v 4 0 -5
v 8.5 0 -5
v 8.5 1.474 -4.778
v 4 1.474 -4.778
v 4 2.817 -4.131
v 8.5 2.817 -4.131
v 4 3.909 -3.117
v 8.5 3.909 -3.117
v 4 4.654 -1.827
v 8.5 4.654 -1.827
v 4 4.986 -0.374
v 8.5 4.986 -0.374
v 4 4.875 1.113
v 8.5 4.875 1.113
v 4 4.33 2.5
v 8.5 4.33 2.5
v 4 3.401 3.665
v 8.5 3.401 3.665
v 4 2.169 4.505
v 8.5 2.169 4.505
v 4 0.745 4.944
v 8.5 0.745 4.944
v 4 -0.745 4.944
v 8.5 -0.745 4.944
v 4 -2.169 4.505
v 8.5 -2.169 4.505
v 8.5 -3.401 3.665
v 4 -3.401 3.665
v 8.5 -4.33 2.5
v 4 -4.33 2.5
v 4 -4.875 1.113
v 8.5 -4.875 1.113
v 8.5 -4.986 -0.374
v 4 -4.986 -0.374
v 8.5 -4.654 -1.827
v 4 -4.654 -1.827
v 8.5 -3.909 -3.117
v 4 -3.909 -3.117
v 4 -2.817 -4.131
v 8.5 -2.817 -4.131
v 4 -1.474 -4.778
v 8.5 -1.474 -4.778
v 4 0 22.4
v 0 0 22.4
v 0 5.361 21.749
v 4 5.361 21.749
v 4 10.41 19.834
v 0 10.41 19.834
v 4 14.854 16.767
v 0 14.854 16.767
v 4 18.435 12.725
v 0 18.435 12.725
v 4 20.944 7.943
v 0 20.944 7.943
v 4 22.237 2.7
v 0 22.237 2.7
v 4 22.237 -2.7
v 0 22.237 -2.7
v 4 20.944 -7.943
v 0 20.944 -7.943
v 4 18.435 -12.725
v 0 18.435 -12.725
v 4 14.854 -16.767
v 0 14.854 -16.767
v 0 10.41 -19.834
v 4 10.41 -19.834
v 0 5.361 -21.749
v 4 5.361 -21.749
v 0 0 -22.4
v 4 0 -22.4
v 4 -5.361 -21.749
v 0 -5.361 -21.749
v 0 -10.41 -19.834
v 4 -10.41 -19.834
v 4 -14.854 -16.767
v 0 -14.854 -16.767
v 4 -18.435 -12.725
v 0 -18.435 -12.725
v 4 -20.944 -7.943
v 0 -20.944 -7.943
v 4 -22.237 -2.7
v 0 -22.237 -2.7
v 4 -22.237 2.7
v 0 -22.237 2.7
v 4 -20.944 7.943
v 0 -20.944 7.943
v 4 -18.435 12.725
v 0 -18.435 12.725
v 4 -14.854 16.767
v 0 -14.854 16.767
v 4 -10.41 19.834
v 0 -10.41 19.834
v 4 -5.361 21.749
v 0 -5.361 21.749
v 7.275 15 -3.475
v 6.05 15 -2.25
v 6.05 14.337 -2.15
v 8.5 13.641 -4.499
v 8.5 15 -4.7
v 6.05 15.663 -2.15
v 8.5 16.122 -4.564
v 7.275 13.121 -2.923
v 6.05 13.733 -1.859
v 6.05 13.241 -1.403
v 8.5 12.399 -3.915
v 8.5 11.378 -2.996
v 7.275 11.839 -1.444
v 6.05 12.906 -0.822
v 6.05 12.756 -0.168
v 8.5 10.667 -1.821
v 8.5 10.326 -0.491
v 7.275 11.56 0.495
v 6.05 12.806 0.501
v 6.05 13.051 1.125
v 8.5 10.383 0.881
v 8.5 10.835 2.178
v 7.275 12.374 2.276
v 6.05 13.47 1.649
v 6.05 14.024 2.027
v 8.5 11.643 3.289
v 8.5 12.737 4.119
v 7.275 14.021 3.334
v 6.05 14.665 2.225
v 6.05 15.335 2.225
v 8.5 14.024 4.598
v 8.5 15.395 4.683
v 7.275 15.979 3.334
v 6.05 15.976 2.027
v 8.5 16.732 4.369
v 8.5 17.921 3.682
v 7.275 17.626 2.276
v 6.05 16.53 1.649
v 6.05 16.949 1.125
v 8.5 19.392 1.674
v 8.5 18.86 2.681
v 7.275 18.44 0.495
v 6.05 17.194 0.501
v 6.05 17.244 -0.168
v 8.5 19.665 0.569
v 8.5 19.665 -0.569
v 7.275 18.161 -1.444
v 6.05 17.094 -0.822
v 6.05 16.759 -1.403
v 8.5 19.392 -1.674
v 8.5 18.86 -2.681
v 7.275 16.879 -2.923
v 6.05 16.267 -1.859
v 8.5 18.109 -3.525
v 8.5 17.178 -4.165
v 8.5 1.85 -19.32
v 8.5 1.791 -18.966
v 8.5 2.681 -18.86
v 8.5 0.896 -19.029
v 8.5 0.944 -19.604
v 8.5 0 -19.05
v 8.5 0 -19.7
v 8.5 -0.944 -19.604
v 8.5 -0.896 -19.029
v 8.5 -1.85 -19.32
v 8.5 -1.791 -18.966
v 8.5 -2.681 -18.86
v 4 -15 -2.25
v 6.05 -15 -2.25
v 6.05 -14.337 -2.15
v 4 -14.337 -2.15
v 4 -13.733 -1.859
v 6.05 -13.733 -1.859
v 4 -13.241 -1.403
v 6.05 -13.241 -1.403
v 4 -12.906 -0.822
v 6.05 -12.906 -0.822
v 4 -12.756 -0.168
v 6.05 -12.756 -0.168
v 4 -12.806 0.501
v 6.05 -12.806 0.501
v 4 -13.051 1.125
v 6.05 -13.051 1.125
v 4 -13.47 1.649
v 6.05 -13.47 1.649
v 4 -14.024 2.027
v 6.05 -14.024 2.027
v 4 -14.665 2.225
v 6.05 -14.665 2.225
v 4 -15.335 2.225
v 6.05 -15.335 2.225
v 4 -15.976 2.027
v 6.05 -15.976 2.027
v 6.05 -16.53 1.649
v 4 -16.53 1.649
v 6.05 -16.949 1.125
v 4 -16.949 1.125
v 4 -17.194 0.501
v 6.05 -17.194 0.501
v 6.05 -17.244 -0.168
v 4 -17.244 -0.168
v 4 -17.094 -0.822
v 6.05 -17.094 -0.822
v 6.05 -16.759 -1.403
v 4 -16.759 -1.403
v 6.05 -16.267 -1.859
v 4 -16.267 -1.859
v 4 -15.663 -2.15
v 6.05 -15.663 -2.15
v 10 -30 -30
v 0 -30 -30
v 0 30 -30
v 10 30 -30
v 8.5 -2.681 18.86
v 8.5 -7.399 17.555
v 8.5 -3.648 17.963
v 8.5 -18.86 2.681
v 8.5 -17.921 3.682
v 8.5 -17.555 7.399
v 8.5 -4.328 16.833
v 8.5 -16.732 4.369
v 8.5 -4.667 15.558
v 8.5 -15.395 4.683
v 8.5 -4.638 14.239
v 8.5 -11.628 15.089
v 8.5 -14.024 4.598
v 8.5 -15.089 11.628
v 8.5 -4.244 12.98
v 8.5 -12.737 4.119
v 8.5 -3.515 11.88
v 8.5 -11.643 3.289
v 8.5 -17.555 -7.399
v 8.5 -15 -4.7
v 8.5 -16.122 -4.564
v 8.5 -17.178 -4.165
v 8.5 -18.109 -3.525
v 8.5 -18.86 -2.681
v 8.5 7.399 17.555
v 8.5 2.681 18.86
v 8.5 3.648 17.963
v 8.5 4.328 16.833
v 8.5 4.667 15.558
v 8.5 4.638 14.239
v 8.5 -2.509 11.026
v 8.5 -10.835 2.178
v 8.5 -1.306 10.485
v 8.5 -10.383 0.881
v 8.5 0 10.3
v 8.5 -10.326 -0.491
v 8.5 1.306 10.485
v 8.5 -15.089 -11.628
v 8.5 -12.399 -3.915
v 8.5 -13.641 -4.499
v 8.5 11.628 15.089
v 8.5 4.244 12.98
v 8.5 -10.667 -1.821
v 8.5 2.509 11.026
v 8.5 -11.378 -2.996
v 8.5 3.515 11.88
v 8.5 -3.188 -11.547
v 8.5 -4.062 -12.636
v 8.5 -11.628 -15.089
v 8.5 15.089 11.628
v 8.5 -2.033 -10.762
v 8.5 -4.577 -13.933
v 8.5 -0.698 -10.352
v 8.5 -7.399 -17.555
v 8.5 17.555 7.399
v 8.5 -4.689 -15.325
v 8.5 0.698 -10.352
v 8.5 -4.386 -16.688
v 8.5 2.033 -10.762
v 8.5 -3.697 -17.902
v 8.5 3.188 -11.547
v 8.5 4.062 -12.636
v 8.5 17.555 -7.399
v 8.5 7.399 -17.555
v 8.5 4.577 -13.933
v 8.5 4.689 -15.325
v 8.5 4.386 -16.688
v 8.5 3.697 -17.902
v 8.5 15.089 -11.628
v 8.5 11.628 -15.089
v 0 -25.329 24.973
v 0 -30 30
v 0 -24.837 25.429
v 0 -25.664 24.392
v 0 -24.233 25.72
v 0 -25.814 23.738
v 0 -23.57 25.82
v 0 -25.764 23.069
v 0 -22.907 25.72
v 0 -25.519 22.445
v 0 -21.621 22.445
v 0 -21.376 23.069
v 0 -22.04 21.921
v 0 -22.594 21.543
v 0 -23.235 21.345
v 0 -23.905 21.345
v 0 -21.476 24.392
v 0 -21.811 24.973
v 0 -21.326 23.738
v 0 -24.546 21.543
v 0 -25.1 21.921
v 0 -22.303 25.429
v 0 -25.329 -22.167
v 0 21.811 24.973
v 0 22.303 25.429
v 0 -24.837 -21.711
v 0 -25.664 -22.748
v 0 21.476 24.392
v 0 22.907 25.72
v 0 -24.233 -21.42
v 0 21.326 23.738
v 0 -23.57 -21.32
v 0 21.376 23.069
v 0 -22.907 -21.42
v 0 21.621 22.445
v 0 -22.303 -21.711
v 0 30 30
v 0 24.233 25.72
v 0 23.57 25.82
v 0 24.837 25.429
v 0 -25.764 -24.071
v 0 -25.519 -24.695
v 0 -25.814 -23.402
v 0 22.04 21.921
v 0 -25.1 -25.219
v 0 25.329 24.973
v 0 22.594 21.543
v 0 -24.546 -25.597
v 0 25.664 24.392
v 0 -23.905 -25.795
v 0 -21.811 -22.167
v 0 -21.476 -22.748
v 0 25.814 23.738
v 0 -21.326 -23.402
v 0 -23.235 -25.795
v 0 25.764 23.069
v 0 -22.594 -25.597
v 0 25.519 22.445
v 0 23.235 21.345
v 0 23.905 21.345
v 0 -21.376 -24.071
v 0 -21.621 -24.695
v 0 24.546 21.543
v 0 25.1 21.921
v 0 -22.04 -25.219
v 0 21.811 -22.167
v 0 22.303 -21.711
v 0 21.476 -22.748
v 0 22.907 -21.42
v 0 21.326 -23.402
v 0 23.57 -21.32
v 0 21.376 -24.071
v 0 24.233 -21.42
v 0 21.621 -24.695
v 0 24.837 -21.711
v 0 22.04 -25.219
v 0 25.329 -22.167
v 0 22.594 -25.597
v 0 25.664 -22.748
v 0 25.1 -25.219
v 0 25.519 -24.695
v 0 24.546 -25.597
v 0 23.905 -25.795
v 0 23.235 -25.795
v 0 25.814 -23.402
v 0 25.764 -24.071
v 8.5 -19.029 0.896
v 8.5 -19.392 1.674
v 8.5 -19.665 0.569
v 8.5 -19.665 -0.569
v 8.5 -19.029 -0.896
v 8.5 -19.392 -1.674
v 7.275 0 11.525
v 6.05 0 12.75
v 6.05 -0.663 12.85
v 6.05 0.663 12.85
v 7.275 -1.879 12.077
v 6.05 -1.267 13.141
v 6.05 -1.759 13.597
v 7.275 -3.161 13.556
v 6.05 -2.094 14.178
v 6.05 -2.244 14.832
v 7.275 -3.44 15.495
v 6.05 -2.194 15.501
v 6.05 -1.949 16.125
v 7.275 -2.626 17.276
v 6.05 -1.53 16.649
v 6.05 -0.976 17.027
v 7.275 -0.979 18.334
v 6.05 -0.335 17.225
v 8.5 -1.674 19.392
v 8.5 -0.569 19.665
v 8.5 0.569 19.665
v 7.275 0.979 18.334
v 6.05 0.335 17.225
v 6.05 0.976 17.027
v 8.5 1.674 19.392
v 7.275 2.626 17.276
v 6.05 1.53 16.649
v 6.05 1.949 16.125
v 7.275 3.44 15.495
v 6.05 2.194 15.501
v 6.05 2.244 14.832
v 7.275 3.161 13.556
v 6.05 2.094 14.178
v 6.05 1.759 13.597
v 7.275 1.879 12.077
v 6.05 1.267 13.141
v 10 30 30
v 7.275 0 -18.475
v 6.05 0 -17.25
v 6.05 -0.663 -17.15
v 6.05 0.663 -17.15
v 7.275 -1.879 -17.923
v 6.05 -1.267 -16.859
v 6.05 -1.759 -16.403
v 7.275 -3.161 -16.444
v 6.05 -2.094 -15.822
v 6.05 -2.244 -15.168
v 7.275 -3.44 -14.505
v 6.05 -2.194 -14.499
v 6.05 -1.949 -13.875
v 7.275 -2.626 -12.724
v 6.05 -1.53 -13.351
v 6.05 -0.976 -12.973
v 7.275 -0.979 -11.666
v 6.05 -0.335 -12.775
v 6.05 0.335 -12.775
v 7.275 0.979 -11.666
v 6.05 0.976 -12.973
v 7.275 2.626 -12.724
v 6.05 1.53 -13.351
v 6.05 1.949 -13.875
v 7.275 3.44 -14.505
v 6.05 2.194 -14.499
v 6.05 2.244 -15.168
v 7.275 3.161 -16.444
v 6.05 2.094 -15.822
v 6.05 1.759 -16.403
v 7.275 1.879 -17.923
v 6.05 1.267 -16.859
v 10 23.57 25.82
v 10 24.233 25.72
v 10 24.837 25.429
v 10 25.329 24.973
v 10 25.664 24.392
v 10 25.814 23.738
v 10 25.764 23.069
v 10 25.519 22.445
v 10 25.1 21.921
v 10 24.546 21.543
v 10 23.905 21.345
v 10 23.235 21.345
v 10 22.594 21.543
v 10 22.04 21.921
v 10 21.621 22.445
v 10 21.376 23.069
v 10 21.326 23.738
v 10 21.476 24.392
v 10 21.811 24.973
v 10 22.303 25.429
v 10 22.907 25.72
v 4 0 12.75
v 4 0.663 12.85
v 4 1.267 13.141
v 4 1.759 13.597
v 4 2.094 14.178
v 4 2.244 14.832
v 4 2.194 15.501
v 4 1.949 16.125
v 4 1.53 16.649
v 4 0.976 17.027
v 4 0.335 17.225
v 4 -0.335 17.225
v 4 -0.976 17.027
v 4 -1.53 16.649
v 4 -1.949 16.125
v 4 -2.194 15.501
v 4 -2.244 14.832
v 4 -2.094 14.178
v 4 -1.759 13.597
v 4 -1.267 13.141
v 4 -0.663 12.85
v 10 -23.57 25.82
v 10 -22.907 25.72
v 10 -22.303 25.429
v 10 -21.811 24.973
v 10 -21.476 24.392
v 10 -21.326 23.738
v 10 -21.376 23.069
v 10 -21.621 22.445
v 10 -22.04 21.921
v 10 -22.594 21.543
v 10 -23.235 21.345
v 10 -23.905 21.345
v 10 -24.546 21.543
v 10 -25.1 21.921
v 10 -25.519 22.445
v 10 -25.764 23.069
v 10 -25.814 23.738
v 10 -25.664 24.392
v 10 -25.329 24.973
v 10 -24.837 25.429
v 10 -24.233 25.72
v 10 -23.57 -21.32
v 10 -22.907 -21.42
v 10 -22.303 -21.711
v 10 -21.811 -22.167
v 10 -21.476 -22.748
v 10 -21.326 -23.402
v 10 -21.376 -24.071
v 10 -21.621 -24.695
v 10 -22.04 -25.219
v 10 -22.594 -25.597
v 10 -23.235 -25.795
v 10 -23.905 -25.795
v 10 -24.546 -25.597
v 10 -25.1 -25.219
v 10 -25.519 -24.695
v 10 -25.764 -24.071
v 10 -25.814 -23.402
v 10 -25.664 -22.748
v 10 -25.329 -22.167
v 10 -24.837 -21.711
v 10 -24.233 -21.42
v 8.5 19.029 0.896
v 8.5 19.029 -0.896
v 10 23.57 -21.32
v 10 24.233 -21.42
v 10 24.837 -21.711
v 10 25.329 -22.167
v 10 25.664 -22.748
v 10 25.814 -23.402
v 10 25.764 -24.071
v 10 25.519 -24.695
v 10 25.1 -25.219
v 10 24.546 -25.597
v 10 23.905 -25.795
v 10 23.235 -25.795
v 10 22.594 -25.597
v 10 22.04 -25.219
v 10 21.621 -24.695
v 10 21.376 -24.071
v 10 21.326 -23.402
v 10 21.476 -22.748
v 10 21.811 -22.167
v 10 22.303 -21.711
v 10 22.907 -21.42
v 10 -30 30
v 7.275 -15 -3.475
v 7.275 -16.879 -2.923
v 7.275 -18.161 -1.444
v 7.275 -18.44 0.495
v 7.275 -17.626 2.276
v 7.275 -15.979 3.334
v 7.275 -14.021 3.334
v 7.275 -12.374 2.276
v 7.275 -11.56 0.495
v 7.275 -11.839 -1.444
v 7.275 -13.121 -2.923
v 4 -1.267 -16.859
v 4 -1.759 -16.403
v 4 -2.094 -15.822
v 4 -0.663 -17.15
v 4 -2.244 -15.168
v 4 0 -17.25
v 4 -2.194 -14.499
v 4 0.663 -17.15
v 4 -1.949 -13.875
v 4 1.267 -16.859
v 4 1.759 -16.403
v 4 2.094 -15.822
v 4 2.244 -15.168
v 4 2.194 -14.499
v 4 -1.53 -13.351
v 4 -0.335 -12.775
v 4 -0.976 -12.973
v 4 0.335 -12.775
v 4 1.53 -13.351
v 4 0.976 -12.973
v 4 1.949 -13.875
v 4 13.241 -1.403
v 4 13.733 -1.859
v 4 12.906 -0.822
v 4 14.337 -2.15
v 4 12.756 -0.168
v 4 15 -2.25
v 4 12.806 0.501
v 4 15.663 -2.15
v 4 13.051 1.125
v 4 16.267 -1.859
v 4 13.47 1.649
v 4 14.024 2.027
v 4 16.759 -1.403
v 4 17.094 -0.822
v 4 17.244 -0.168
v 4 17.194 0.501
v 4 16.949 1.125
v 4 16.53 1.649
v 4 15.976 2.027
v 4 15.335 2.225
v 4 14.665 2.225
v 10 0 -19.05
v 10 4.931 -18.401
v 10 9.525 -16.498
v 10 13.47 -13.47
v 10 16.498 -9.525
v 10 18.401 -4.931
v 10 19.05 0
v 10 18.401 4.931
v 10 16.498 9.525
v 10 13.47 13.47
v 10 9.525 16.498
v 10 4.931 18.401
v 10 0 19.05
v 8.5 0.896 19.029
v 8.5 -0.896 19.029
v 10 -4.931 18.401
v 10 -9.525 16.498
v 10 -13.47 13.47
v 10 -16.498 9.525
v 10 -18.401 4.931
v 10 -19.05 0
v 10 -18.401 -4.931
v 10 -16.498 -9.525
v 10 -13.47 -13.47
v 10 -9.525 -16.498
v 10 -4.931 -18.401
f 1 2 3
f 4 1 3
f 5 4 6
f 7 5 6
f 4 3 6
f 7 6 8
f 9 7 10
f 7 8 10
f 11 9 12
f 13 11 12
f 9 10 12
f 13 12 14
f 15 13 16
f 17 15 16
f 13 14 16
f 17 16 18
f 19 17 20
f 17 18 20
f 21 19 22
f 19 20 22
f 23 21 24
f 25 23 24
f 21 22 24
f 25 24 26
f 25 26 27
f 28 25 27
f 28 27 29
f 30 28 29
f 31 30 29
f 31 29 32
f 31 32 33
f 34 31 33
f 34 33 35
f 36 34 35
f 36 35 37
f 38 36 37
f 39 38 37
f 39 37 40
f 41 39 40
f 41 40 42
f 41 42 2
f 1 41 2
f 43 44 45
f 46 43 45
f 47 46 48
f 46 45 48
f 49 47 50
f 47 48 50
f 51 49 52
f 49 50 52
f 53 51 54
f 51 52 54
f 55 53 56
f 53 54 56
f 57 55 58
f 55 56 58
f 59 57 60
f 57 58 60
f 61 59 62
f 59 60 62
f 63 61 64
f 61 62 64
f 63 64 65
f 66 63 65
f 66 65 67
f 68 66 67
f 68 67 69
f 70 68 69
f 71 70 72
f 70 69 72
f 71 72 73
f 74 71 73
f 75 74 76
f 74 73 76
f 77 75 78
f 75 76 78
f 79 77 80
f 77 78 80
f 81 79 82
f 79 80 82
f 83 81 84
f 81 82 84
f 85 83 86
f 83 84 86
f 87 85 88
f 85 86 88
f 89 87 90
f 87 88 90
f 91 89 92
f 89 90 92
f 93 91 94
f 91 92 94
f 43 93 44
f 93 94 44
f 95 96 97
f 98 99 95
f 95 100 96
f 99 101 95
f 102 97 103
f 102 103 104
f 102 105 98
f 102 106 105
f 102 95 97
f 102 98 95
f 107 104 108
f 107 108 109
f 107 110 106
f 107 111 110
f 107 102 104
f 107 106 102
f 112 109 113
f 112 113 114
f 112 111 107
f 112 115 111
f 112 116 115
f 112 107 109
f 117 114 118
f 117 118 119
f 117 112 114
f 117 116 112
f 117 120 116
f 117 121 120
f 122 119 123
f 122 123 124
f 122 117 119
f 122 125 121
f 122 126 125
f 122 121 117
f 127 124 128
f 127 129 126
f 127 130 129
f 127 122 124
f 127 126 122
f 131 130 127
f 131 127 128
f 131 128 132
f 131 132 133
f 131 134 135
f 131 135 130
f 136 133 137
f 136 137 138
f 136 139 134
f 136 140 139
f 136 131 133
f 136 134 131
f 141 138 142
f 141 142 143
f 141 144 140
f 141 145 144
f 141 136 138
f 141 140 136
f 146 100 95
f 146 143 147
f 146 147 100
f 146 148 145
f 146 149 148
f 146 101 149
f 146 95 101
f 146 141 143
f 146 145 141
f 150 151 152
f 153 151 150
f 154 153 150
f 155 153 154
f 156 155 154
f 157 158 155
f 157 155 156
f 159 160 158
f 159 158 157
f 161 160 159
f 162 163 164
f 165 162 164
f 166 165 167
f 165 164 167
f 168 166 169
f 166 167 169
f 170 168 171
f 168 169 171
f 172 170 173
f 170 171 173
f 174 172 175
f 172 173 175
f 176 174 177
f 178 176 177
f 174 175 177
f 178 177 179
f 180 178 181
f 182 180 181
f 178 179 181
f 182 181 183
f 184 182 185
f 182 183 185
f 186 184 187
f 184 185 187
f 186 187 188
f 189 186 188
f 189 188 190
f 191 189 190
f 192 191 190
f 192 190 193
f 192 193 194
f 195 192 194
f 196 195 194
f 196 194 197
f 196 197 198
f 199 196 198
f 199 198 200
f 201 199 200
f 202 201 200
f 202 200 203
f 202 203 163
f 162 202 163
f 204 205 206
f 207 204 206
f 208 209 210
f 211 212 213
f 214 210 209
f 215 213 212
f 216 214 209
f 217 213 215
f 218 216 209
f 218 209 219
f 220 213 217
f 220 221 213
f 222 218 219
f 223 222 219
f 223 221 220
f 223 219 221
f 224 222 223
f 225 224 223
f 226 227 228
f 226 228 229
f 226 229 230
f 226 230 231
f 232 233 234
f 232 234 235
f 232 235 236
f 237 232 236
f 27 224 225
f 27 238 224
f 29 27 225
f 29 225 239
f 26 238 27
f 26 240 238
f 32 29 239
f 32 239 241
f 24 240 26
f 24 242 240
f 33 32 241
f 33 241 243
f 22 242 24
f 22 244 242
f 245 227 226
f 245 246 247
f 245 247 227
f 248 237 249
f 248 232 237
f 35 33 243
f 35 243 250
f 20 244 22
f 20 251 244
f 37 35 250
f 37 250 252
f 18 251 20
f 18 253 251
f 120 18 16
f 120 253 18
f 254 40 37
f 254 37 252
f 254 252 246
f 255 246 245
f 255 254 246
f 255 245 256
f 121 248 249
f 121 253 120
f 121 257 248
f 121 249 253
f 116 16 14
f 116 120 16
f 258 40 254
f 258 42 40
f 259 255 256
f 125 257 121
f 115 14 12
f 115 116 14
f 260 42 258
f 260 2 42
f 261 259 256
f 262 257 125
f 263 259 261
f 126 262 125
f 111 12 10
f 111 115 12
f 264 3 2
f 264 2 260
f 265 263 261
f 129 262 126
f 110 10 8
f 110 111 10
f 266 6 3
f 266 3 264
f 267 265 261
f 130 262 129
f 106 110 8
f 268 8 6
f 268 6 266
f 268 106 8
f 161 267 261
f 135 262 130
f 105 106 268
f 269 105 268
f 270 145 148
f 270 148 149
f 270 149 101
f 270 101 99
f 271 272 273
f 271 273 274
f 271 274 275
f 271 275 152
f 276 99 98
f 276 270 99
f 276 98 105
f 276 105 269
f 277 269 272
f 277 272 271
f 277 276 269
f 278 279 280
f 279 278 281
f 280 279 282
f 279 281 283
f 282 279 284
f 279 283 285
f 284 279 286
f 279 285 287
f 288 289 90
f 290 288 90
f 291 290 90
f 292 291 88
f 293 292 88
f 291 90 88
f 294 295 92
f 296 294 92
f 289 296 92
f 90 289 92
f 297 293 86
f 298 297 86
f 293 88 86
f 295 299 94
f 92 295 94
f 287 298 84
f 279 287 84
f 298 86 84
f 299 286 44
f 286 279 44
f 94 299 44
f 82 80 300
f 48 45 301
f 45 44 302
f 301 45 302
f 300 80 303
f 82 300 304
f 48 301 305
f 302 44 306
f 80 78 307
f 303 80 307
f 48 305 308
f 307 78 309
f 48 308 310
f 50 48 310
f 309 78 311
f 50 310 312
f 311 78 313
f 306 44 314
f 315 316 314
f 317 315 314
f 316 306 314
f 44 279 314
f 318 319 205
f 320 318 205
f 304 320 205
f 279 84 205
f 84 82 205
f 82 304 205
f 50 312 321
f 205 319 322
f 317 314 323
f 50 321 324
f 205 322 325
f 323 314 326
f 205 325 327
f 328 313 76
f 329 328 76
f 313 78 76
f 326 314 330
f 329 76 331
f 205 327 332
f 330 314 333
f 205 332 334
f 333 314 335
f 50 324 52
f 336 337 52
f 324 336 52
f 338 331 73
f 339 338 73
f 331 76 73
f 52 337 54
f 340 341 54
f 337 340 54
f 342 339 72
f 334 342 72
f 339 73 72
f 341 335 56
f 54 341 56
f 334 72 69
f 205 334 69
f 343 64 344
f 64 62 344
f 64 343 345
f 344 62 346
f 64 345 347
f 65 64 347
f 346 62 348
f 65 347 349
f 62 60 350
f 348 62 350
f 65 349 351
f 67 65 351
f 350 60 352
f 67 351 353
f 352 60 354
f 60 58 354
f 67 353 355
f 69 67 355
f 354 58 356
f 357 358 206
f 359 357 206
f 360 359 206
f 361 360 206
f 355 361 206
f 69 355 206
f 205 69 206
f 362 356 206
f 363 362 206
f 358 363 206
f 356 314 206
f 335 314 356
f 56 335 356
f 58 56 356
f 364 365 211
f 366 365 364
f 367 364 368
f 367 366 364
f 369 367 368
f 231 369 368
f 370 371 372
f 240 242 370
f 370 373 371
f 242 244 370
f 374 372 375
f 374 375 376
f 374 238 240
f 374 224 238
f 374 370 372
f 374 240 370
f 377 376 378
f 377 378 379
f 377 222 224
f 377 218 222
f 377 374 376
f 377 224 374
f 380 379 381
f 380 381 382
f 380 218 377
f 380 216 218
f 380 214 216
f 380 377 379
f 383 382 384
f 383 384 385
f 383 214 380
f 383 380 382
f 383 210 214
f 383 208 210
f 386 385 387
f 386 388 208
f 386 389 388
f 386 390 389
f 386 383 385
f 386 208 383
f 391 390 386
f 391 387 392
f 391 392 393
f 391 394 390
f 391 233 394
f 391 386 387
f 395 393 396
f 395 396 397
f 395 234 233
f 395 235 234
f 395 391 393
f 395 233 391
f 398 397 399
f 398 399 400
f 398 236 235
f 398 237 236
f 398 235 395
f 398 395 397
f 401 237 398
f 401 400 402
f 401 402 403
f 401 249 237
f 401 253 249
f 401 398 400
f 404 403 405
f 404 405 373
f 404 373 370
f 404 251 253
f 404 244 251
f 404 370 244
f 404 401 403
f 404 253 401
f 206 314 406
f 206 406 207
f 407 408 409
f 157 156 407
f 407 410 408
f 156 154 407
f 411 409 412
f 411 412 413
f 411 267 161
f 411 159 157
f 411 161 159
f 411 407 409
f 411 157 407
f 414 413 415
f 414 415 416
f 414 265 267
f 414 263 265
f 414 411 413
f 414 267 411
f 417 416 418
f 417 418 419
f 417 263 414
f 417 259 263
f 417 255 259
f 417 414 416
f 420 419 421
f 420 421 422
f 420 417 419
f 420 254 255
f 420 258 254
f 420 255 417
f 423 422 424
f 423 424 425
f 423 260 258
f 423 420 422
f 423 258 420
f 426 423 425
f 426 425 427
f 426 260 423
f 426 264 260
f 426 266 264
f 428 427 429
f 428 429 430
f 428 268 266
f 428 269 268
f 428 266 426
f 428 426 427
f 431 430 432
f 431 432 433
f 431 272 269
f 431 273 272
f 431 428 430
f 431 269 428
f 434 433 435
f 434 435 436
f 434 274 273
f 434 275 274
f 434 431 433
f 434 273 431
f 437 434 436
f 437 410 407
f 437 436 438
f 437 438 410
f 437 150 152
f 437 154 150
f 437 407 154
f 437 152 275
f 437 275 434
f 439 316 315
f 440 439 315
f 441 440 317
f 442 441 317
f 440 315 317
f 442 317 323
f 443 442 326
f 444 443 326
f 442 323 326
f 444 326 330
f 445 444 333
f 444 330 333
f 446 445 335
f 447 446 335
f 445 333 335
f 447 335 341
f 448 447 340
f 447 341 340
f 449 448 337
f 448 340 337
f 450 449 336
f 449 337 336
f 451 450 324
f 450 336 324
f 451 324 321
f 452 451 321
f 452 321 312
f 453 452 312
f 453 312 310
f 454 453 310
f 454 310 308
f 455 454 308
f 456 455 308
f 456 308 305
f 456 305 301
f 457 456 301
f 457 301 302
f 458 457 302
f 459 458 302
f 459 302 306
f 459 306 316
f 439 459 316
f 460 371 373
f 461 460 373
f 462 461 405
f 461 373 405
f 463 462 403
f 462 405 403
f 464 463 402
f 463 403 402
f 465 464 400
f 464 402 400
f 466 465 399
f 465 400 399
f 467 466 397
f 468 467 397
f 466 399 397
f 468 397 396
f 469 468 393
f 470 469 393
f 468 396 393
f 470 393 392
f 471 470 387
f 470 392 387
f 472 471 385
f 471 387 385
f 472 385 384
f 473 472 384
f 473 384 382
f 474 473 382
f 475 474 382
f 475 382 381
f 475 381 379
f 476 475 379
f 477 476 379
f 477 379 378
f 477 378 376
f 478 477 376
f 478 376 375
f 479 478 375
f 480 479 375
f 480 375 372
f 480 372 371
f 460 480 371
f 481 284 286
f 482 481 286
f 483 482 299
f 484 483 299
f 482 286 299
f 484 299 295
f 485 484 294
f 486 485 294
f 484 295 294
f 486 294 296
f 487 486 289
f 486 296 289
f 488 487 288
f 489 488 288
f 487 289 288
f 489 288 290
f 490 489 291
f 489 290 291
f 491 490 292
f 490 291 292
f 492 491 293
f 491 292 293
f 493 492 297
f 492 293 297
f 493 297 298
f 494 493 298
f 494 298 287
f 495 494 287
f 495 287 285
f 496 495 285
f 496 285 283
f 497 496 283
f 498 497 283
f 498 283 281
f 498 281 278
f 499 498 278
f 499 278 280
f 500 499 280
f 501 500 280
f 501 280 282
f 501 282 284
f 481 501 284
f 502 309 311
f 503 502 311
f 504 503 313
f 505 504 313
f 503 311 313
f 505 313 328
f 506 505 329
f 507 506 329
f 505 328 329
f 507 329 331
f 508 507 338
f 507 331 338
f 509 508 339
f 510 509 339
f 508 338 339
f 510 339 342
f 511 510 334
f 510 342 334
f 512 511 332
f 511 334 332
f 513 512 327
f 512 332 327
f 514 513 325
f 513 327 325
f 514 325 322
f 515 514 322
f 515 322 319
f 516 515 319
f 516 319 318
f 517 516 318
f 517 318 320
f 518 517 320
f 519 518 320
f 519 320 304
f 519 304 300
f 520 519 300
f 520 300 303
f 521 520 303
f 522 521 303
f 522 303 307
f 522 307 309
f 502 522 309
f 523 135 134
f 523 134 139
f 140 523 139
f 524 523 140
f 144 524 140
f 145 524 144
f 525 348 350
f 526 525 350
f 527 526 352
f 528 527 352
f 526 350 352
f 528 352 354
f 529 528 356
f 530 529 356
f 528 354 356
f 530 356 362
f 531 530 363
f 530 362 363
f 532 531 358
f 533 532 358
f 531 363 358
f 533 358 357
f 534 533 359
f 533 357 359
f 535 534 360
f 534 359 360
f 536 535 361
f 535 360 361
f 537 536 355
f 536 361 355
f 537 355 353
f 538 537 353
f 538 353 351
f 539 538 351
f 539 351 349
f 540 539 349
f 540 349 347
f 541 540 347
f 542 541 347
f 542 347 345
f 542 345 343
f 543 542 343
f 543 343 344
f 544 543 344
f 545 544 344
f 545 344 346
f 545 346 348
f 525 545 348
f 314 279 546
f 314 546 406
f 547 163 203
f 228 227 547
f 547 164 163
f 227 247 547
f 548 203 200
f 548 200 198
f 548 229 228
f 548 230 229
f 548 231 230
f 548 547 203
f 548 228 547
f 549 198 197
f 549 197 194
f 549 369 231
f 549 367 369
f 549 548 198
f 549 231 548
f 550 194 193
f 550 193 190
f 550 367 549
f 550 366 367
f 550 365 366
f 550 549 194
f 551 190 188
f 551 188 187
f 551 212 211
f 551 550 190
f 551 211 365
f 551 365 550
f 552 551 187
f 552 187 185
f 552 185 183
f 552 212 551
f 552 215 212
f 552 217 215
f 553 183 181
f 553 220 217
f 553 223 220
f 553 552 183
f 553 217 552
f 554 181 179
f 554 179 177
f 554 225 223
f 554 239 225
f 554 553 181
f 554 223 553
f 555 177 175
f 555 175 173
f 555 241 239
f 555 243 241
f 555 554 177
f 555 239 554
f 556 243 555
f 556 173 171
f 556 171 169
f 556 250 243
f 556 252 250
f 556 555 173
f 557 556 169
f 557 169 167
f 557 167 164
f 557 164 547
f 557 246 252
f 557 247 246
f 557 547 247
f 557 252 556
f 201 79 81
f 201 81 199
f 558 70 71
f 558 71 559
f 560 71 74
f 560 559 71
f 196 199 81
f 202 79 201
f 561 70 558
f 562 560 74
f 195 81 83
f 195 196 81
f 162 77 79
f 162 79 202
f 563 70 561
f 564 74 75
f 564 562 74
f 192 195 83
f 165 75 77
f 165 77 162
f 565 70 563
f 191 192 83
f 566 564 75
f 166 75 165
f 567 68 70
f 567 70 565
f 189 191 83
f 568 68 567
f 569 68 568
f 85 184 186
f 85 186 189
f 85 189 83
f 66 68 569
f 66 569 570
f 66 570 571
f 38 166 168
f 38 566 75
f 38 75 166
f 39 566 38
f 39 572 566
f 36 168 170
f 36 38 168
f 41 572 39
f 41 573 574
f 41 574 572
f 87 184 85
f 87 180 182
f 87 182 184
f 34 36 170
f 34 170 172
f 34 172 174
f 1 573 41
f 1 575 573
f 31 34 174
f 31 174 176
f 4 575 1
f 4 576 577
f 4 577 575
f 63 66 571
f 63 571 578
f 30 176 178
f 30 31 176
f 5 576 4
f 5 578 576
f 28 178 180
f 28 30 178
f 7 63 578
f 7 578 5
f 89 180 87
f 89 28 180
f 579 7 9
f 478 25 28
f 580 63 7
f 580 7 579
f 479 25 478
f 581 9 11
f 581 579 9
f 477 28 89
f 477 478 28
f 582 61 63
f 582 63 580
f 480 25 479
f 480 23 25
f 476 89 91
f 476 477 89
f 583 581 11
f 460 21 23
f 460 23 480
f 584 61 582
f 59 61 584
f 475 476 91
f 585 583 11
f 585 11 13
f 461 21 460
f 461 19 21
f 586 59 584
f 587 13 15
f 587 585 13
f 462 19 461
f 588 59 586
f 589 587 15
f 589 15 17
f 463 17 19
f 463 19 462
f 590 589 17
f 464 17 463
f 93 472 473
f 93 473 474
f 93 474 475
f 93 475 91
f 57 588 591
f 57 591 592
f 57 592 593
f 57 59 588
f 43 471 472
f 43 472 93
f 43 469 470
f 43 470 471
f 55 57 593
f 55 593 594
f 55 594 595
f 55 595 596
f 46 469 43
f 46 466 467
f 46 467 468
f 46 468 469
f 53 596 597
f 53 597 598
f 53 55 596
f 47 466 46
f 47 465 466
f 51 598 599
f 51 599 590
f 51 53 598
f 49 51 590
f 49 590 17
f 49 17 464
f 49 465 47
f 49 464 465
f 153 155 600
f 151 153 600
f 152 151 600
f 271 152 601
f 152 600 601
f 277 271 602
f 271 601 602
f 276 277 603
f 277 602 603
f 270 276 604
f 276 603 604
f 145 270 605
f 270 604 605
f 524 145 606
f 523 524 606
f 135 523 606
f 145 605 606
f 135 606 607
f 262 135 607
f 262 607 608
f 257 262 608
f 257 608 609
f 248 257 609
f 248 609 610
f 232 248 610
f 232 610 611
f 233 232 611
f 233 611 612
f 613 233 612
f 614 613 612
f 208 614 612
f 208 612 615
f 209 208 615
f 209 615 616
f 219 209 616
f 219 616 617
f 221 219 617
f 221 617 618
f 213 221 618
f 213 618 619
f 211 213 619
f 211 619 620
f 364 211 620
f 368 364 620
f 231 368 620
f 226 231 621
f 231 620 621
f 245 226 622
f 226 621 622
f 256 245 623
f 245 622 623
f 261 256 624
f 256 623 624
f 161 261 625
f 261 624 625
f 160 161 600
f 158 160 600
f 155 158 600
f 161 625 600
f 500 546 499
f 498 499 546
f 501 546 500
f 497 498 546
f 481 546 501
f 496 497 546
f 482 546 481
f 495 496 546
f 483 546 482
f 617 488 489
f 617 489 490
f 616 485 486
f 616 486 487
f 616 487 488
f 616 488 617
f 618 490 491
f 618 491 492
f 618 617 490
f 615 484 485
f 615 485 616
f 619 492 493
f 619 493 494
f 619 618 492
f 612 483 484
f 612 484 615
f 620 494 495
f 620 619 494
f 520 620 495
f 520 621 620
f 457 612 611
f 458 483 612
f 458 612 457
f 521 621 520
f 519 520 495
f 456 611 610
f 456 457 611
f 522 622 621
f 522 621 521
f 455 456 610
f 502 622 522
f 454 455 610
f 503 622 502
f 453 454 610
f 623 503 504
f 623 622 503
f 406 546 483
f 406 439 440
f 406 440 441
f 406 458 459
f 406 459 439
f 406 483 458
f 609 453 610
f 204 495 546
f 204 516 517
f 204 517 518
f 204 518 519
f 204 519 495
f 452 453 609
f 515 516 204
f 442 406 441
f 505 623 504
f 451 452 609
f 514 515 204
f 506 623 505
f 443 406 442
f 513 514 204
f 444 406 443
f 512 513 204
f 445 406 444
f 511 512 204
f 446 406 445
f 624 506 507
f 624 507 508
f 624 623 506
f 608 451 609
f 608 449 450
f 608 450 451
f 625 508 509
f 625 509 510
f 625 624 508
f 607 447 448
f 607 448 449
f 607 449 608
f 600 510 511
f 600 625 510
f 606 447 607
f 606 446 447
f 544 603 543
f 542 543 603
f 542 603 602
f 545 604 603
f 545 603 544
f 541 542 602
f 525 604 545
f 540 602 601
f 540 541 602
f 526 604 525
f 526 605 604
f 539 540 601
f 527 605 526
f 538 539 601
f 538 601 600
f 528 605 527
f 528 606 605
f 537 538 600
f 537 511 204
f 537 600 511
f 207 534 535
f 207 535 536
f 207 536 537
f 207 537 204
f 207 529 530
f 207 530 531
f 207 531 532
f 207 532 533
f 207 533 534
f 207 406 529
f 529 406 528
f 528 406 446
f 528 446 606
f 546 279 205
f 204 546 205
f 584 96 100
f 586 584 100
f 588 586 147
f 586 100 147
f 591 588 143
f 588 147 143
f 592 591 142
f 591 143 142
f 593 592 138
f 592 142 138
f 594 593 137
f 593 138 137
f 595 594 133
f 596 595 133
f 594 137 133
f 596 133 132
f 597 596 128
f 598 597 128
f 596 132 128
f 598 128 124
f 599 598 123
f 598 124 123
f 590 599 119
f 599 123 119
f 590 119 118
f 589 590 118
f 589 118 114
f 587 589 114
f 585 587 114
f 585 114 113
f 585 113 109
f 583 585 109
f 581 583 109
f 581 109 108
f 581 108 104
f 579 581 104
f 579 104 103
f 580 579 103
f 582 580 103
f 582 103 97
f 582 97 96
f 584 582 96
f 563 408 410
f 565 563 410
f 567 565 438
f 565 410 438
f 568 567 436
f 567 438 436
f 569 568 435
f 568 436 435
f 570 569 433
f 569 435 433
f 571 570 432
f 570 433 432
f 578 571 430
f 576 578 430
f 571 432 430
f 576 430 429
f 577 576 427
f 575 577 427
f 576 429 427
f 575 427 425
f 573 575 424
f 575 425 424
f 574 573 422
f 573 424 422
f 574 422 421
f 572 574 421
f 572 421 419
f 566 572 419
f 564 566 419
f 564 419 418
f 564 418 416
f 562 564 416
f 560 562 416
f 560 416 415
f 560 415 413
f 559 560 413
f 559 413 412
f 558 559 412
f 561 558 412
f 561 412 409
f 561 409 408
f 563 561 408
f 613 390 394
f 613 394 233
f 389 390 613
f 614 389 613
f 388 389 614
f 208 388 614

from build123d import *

# Parameters (mm, degrees)
SKETCH1_W                                      = 60
SKETCH1_H                                      = 60
EXTRUDE1_DEPTH                                 = 10
SKETCH3_R                                      = 5
EXTRUDE2_DEPTH                                 = 44.588989435
SKETCH5_R                                      = 19.05
EXTRUDE3_DEPTH                                 = 1.5
SKETCH6_R                                      = 22.4
EXTRUDE4_DEPTH                                 = 4
SKETCH7_R                                      = 2.25
EXTRUDE6_DEPTH                                 = 44.588989435
SKETCH8_R                                      = 2.25
EXTRUDE7_DEPTH                                 = 44.269504273
CSK_FOR_M4_FLAT_HEAD_MACHINE_SCREW1_AT_2_COUNT = 2
CSK_FOR_M4_FLAT_HEAD_MACHINE_SCREW1_AT_2_PITCH = 21.213203436
CSK_FOR_M4_FLAT_HEAD_MACHINE_SCREW1_AT_3_COUNT = 2
CSK_FOR_M4_FLAT_HEAD_MACHINE_SCREW1_AT_3_PITCH = 30
CSK_FOR_M4_FLAT_HEAD_MACHINE_SCREW1_AT_4_COUNT = 2
CSK_FOR_M4_FLAT_HEAD_MACHINE_SCREW1_AT_4_PITCH = 21.213203436


with BuildPart() as part:
    # Sketch1 → Extrude1 (new body)
    with BuildSketch(Plane(origin=(0, 0, 0), x_dir=(0, 0, -1), z_dir=(1, 0, 0))):
        Rectangle(SKETCH1_W, SKETCH1_H)
    extrude(amount=EXTRUDE1_DEPTH)

    # Sketch3 → Extrude2 (cut, through all)
    with BuildSketch(Plane(origin=(10, 0, 0), x_dir=(0, 0, -1), z_dir=(1, 0, 0))):
        Circle(SKETCH3_R)
    extrude(amount=-EXTRUDE2_DEPTH, mode=Mode.SUBTRACT)

    # Sketch5 → Extrude3 (cut)
    with BuildSketch(Plane(origin=(10, 0, 0), x_dir=(0, 0, -1), z_dir=(1, 0, 0))):
        Circle(SKETCH5_R)
    extrude(amount=-EXTRUDE3_DEPTH, mode=Mode.SUBTRACT)

    # Sketch6 → Extrude4 (cut)
    with BuildSketch(Plane.ZY):
        Circle(SKETCH6_R)
    extrude(amount=-EXTRUDE4_DEPTH, mode=Mode.SUBTRACT)

    # Sketch7 → Extrude6 (cut, through all)
    with BuildSketch(Plane.ZY):
        with Locations((23.57, 23.57)):
            Circle(SKETCH7_R)
        with Locations((-23.57, 23.57)):
            Circle(SKETCH7_R)
        with Locations((23.57, -23.57)):
            Circle(SKETCH7_R)
        with Locations((-23.57, -23.57)):
            Circle(SKETCH7_R)
    extrude(amount=-EXTRUDE6_DEPTH, mode=Mode.SUBTRACT)

    # Sketch8 → Extrude7 (cut, through all)
    with BuildSketch(Plane(origin=(8.5, 0, 0), x_dir=(0, 0, -1), z_dir=(1, 0, 0))):
        with Locations((0, 15)):
            Circle(SKETCH8_R)
        with Locations((-15, 0)):
            Circle(SKETCH8_R)
        with Locations((0, -15)):
            Circle(SKETCH8_R)
        with Locations((15, 0)):
            Circle(SKETCH8_R)
    extrude(amount=-EXTRUDE7_DEPTH, mode=Mode.SUBTRACT)

    # Sketch9 → CSK for M4 Flat Head Machine Screw1 (revolve, cut)
    with BuildSketch(Plane(origin=(8.5, 15, 0), x_dir=(0, 0, -1), z_dir=(0, 1, 0))):
        Polygon((0, 0), (0, 8.5), (2.25, 8.5), (2.25, 2.45), (4.7, 0), align=None)
    csk_for_m4_flat_head_machine_screw1 = revolve(axis=Axis((14.85, 15, 0), (-1, 0, 0)), mode=Mode.SUBTRACT)

    # CSK for M4 Flat Head Machine Screw1 at 2: CSK for M4 Flat Head Machine Screw1 ×2
    with Locations(*[Vector(0, -0.7071067811865476, 0.7071067811865476) * (i * CSK_FOR_M4_FLAT_HEAD_MACHINE_SCREW1_AT_2_PITCH) for i in range(1, CSK_FOR_M4_FLAT_HEAD_MACHINE_SCREW1_AT_2_COUNT)]):
        add(csk_for_m4_flat_head_machine_screw1, mode=Mode.SUBTRACT)

    # CSK for M4 Flat Head Machine Screw1 at 3: CSK for M4 Flat Head Machine Screw1 ×2
    with Locations(*[(0, -i * CSK_FOR_M4_FLAT_HEAD_MACHINE_SCREW1_AT_3_PITCH, 0) for i in range(1, CSK_FOR_M4_FLAT_HEAD_MACHINE_SCREW1_AT_3_COUNT)]):
        add(csk_for_m4_flat_head_machine_screw1, mode=Mode.SUBTRACT)

    # CSK for M4 Flat Head Machine Screw1 at 4: CSK for M4 Flat Head Machine Screw1 ×2
    with Locations(*[Vector(0, -0.7071067811865476, -0.7071067811865476) * (i * CSK_FOR_M4_FLAT_HEAD_MACHINE_SCREW1_AT_4_PITCH) for i in range(1, CSK_FOR_M4_FLAT_HEAD_MACHINE_SCREW1_AT_4_COUNT)]):
        add(csk_for_m4_flat_head_machine_screw1, mode=Mode.SUBTRACT)


solid = part.part
